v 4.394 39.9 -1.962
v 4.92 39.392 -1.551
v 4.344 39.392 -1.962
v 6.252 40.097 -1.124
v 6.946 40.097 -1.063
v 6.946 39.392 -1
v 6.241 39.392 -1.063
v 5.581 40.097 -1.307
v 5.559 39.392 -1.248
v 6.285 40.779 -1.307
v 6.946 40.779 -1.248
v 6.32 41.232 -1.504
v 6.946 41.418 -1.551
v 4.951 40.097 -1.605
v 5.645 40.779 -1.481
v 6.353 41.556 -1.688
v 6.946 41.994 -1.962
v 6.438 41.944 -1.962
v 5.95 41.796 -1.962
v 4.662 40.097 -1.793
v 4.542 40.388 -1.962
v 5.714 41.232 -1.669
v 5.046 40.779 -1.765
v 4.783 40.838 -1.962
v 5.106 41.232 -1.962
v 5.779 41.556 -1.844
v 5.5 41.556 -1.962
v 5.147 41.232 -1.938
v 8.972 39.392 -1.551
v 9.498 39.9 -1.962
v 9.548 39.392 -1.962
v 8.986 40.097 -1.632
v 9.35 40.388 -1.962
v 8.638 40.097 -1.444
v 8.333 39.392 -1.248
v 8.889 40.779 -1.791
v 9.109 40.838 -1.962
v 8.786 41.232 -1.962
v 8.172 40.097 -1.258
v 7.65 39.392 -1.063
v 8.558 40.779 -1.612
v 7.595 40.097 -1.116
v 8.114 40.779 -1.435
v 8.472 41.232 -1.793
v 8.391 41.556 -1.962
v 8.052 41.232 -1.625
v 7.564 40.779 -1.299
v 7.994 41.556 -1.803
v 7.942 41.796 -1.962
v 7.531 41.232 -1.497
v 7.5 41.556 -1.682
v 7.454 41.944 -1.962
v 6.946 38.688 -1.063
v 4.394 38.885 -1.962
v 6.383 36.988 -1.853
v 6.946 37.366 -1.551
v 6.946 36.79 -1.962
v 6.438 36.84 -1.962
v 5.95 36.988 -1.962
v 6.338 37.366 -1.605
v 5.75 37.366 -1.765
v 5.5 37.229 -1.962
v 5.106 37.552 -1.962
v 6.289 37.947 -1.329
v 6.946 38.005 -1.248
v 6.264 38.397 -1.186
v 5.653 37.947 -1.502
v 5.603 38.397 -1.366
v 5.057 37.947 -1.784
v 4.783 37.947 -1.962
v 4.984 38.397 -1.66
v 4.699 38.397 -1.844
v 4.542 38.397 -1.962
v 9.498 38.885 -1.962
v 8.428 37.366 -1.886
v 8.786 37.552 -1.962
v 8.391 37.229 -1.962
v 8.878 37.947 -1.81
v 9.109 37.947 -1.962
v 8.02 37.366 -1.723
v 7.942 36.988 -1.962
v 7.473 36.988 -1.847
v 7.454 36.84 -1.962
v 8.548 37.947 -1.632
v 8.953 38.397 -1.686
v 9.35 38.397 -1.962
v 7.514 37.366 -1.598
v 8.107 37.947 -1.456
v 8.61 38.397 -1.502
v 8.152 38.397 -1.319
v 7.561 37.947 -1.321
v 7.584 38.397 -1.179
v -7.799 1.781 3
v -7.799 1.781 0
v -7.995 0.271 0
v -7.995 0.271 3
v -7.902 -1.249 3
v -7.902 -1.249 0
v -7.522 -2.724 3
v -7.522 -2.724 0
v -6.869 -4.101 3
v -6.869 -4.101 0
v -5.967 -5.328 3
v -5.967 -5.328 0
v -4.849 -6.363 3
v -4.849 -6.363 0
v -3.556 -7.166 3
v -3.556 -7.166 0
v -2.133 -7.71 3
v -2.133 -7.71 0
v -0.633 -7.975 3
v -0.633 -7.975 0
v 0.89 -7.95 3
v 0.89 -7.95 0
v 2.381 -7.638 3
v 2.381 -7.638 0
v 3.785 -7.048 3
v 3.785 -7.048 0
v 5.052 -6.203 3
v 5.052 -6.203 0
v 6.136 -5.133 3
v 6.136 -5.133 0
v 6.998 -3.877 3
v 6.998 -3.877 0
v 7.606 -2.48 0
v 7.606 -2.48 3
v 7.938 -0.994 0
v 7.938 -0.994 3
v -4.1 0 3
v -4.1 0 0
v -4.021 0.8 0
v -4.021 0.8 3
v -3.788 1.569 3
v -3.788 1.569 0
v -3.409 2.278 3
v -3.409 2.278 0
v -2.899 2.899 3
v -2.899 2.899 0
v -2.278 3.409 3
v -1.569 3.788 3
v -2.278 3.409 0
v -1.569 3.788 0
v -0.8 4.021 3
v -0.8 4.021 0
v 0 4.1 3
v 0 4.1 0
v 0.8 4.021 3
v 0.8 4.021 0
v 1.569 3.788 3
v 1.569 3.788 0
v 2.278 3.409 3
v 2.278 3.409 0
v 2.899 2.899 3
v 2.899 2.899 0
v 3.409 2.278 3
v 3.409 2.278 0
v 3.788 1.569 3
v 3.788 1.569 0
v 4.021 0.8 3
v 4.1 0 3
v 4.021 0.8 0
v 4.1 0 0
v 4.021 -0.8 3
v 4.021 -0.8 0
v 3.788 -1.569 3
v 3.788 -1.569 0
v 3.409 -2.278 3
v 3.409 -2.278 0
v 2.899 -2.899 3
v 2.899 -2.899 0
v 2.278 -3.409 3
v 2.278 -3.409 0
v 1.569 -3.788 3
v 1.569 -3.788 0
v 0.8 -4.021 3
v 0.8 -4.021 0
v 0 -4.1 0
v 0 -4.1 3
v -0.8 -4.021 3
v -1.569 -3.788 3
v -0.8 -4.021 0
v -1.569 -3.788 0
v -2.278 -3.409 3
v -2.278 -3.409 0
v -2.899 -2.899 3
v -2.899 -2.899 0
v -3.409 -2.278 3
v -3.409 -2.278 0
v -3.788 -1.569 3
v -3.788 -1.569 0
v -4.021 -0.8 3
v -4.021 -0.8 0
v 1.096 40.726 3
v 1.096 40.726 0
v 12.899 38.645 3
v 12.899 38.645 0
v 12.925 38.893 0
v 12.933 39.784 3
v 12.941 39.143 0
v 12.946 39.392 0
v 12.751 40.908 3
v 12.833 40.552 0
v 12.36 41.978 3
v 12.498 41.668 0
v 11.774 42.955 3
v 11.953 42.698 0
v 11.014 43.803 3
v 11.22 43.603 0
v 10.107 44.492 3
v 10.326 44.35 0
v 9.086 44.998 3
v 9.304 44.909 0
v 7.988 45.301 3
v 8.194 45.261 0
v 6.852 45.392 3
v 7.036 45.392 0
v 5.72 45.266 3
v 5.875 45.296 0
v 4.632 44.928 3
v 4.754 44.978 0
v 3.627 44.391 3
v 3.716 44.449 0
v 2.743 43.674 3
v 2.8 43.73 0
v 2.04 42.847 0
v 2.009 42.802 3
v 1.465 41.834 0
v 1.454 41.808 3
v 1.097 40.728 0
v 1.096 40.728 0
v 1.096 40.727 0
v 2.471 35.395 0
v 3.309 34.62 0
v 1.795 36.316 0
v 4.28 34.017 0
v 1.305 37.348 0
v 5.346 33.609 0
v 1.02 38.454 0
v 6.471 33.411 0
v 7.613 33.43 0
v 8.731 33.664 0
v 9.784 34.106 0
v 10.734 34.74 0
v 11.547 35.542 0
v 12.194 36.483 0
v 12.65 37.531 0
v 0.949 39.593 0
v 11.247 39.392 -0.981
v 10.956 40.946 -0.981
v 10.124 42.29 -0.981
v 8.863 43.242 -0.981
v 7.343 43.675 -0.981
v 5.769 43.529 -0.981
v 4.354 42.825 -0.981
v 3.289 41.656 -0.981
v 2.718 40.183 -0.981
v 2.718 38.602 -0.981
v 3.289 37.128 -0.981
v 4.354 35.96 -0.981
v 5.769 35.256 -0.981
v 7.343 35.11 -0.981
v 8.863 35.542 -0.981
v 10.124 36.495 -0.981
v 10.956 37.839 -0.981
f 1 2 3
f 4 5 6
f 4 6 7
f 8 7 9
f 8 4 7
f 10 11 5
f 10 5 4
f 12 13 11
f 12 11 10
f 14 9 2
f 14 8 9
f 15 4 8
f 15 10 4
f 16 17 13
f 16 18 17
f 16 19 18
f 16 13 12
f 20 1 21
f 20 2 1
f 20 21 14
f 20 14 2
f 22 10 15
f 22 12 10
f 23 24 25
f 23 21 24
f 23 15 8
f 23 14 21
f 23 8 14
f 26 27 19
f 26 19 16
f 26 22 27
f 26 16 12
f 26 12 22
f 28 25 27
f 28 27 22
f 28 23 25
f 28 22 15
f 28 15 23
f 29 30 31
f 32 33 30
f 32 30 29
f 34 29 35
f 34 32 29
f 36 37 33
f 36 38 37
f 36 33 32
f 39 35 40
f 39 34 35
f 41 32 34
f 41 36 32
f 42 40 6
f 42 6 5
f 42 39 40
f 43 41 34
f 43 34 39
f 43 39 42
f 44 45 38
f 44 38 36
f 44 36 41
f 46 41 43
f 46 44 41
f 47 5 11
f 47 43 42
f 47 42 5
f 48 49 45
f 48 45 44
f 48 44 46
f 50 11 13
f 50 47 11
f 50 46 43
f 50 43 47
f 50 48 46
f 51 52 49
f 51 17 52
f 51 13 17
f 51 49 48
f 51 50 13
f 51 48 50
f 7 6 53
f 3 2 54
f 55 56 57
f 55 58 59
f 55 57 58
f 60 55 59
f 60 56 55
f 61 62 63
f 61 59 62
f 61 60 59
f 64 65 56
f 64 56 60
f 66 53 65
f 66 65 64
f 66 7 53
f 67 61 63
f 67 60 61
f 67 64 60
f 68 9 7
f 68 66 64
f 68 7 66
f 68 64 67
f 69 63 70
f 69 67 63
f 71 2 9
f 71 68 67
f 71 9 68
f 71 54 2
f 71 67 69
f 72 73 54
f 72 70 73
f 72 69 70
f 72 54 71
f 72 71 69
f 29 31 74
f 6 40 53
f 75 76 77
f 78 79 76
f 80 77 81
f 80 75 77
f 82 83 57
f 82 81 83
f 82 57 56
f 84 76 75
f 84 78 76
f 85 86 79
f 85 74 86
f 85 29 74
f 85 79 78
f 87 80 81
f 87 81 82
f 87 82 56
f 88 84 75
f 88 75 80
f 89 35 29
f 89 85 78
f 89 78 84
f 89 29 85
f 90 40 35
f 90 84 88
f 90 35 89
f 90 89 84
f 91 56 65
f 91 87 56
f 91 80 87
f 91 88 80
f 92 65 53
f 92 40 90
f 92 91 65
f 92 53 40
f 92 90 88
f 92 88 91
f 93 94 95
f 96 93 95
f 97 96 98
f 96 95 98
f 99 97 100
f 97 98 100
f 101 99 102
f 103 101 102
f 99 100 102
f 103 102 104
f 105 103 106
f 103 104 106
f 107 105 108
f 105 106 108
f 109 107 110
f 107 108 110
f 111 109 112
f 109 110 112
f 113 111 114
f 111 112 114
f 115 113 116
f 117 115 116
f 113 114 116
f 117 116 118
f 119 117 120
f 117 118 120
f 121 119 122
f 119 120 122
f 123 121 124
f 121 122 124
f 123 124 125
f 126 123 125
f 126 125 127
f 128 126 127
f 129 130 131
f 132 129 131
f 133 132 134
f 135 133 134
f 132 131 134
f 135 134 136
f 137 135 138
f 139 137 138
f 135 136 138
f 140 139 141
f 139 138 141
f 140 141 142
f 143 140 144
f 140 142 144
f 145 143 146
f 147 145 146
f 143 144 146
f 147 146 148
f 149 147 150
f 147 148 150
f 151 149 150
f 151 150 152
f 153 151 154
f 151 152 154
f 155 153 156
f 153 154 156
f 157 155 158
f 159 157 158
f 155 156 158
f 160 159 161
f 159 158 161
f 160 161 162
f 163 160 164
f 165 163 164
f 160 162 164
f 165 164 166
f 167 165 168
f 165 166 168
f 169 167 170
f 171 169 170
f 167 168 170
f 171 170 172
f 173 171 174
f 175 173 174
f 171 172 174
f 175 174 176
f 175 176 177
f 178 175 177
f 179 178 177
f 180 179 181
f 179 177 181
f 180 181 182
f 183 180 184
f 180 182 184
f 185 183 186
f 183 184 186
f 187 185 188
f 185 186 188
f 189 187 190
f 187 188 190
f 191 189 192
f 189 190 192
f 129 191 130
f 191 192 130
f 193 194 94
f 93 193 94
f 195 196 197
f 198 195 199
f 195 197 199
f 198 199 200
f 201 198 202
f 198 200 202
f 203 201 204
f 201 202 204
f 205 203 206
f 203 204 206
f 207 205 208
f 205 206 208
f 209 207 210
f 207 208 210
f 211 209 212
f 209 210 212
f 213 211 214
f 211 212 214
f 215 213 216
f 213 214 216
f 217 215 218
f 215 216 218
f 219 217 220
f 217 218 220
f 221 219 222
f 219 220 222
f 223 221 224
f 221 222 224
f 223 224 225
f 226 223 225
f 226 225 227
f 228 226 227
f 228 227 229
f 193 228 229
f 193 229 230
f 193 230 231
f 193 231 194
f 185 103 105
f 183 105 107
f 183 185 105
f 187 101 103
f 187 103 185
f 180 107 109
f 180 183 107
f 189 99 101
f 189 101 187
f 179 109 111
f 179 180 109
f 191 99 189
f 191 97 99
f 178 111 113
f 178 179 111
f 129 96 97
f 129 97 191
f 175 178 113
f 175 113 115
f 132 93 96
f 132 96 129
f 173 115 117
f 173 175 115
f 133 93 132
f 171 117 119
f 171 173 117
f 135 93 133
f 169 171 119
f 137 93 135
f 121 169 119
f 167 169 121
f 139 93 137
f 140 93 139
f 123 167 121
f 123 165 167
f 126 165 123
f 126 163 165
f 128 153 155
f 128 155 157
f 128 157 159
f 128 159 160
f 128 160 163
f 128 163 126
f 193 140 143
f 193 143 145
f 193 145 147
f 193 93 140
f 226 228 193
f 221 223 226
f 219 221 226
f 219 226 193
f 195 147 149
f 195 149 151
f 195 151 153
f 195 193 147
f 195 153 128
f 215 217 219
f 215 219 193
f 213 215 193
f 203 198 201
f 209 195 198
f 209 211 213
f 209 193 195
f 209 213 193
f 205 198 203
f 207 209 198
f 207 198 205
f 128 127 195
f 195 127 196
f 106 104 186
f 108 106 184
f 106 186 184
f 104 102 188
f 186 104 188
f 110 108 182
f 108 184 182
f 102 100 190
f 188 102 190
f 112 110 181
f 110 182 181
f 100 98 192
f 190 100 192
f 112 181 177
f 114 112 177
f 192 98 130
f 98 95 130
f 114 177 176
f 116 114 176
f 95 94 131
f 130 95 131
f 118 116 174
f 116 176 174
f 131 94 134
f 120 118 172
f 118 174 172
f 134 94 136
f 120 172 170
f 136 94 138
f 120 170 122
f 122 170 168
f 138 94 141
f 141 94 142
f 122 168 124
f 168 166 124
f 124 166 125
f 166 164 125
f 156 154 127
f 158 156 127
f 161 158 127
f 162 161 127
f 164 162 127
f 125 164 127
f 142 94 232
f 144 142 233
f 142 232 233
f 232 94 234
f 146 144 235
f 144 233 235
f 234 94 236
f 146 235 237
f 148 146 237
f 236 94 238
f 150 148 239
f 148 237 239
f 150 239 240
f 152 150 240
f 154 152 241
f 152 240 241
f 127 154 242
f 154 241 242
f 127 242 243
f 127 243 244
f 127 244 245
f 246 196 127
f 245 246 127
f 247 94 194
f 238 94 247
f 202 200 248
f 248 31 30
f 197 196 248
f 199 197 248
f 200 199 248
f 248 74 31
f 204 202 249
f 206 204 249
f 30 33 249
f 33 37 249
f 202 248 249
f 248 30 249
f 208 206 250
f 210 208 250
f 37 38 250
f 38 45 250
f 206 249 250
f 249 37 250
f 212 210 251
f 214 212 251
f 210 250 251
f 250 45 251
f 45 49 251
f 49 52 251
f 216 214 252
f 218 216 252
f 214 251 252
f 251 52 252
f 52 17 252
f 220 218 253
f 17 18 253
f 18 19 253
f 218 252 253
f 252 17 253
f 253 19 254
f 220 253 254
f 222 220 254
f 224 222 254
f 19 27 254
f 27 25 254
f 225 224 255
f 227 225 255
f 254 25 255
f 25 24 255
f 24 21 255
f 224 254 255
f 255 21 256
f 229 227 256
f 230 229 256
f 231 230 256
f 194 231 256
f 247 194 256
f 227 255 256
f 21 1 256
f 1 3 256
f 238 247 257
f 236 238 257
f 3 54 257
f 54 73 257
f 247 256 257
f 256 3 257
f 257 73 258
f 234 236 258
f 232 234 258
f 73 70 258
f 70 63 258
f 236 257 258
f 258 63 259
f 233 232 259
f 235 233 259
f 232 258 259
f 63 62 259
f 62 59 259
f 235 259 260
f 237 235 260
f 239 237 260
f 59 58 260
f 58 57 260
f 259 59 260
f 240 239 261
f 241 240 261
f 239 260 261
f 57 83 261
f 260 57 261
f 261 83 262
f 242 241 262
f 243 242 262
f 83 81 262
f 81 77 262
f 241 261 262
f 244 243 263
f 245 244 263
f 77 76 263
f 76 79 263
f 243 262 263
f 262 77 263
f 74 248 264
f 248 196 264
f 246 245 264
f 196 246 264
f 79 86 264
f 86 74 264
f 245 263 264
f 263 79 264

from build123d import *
from build123d.topology import SkipClean

# Parameters (mm, degrees)
SKETCH1_R           = 6
SKETCH1_R_2         = 8
BOSS_EXTRUDE1_DEPTH = 3
BOSS_EXTRUDE2_START = -2
SKETCH1_3_R         = 6
BOSS_EXTRUDE2_DEPTH = 2
SKETCH6_R           = 4.1
CUT_EXTRUDE1_DEPTH  = 3


with BuildPart() as part:
    # Sketch1 → Boss-Extrude1 (new body)
    with BuildSketch(Plane.XY):
        with BuildLine():
            ThreePointArc((12.899477, 38.647167), (5.904038, 33.483464), (1.096566, 40.728338))
            Line((1.096566, 40.728338), (-7.799149, 1.781371))
            ThreePointArc((-7.799149, 1.781371), (0.896329, 7.949629), (8, 0))
            ThreePointArc((8, 0), (7.984502, -0.497727), (7.938067, -0.993525))
            Line((7.938067, -0.993525), (12.899477, 38.647167))
        make_face()
        with Locations((6.945927, 39.39231)):
            Circle(SKETCH1_R)
        Circle(SKETCH1_R_2)
    extrude(amount=BOSS_EXTRUDE1_DEPTH)

    # Sketch1<3> → Boss-Extrude2 (add)
    with BuildSketch(Plane.XY.offset(BOSS_EXTRUDE2_START)):
        with Locations(Location((6.945927, 39.39231, 0), (0, 0, 167.134016))):
            Circle(SKETCH1_3_R)
    extrude(amount=BOSS_EXTRUDE2_DEPTH)

    # Sketch3 → Cut-Revolve1 (revolve, cut)
    with SkipClean():  # the faces are left unmerged after this step: merging them gives an invalid solid
        with BuildSketch(Plane(origin=(6.945927, 0, 0), x_dir=(0, 0, -1), z_dir=(1, 0, 0))):
            with BuildLine():
                ThreePointArc((9, 39.39231), (7.828427, 42.220737), (5, 43.39231))
                Line((5, 43.39231), (5, 35.39231))
                ThreePointArc((5, 35.39231), (7.828427, 36.563883), (9, 39.39231))
            make_face()
            with BuildLine():
                Line((5, 35.39231), (5, 43.39231))
                ThreePointArc((5, 43.39231), (1, 39.39231), (5, 35.39231))
            make_face()
        revolve(axis=Axis((6.945927, 43.39231, -5), (0, -1, 0)), mode=Mode.SUBTRACT)

    # Chamfer1: read off the stored shape, not the designer's step
    # Chamfer1 outline → Chamfer1 (revolve, cut)
    with SkipClean():  # the faces are left unmerged after this step: merging them gives an invalid solid
        with BuildSketch(Plane(origin=(6.945927, 39.39231, 0), x_dir=(1, 0, 0), z_dir=(0, -1, 0))):
            Polygon((2.601903, -1.961892), (2.601903, -2), (6, -2), (6, 0), align=None)
        revolve(axis=Axis((6.945927, 39.39231, 0), (0, 0, 1)), mode=Mode.SUBTRACT)

    # Sketch6 → Cut-Extrude1 (cut)
    with SkipClean():  # the faces are left unmerged after this step: merging them gives an invalid solid
        with BuildSketch(Plane(origin=(0, 0, 0), x_dir=(-1, 0, 0), z_dir=(0, 0, -1))):
            Circle(SKETCH6_R)
        extrude(amount=-CUT_EXTRUDE1_DEPTH, mode=Mode.SUBTRACT)


solid = part.part
